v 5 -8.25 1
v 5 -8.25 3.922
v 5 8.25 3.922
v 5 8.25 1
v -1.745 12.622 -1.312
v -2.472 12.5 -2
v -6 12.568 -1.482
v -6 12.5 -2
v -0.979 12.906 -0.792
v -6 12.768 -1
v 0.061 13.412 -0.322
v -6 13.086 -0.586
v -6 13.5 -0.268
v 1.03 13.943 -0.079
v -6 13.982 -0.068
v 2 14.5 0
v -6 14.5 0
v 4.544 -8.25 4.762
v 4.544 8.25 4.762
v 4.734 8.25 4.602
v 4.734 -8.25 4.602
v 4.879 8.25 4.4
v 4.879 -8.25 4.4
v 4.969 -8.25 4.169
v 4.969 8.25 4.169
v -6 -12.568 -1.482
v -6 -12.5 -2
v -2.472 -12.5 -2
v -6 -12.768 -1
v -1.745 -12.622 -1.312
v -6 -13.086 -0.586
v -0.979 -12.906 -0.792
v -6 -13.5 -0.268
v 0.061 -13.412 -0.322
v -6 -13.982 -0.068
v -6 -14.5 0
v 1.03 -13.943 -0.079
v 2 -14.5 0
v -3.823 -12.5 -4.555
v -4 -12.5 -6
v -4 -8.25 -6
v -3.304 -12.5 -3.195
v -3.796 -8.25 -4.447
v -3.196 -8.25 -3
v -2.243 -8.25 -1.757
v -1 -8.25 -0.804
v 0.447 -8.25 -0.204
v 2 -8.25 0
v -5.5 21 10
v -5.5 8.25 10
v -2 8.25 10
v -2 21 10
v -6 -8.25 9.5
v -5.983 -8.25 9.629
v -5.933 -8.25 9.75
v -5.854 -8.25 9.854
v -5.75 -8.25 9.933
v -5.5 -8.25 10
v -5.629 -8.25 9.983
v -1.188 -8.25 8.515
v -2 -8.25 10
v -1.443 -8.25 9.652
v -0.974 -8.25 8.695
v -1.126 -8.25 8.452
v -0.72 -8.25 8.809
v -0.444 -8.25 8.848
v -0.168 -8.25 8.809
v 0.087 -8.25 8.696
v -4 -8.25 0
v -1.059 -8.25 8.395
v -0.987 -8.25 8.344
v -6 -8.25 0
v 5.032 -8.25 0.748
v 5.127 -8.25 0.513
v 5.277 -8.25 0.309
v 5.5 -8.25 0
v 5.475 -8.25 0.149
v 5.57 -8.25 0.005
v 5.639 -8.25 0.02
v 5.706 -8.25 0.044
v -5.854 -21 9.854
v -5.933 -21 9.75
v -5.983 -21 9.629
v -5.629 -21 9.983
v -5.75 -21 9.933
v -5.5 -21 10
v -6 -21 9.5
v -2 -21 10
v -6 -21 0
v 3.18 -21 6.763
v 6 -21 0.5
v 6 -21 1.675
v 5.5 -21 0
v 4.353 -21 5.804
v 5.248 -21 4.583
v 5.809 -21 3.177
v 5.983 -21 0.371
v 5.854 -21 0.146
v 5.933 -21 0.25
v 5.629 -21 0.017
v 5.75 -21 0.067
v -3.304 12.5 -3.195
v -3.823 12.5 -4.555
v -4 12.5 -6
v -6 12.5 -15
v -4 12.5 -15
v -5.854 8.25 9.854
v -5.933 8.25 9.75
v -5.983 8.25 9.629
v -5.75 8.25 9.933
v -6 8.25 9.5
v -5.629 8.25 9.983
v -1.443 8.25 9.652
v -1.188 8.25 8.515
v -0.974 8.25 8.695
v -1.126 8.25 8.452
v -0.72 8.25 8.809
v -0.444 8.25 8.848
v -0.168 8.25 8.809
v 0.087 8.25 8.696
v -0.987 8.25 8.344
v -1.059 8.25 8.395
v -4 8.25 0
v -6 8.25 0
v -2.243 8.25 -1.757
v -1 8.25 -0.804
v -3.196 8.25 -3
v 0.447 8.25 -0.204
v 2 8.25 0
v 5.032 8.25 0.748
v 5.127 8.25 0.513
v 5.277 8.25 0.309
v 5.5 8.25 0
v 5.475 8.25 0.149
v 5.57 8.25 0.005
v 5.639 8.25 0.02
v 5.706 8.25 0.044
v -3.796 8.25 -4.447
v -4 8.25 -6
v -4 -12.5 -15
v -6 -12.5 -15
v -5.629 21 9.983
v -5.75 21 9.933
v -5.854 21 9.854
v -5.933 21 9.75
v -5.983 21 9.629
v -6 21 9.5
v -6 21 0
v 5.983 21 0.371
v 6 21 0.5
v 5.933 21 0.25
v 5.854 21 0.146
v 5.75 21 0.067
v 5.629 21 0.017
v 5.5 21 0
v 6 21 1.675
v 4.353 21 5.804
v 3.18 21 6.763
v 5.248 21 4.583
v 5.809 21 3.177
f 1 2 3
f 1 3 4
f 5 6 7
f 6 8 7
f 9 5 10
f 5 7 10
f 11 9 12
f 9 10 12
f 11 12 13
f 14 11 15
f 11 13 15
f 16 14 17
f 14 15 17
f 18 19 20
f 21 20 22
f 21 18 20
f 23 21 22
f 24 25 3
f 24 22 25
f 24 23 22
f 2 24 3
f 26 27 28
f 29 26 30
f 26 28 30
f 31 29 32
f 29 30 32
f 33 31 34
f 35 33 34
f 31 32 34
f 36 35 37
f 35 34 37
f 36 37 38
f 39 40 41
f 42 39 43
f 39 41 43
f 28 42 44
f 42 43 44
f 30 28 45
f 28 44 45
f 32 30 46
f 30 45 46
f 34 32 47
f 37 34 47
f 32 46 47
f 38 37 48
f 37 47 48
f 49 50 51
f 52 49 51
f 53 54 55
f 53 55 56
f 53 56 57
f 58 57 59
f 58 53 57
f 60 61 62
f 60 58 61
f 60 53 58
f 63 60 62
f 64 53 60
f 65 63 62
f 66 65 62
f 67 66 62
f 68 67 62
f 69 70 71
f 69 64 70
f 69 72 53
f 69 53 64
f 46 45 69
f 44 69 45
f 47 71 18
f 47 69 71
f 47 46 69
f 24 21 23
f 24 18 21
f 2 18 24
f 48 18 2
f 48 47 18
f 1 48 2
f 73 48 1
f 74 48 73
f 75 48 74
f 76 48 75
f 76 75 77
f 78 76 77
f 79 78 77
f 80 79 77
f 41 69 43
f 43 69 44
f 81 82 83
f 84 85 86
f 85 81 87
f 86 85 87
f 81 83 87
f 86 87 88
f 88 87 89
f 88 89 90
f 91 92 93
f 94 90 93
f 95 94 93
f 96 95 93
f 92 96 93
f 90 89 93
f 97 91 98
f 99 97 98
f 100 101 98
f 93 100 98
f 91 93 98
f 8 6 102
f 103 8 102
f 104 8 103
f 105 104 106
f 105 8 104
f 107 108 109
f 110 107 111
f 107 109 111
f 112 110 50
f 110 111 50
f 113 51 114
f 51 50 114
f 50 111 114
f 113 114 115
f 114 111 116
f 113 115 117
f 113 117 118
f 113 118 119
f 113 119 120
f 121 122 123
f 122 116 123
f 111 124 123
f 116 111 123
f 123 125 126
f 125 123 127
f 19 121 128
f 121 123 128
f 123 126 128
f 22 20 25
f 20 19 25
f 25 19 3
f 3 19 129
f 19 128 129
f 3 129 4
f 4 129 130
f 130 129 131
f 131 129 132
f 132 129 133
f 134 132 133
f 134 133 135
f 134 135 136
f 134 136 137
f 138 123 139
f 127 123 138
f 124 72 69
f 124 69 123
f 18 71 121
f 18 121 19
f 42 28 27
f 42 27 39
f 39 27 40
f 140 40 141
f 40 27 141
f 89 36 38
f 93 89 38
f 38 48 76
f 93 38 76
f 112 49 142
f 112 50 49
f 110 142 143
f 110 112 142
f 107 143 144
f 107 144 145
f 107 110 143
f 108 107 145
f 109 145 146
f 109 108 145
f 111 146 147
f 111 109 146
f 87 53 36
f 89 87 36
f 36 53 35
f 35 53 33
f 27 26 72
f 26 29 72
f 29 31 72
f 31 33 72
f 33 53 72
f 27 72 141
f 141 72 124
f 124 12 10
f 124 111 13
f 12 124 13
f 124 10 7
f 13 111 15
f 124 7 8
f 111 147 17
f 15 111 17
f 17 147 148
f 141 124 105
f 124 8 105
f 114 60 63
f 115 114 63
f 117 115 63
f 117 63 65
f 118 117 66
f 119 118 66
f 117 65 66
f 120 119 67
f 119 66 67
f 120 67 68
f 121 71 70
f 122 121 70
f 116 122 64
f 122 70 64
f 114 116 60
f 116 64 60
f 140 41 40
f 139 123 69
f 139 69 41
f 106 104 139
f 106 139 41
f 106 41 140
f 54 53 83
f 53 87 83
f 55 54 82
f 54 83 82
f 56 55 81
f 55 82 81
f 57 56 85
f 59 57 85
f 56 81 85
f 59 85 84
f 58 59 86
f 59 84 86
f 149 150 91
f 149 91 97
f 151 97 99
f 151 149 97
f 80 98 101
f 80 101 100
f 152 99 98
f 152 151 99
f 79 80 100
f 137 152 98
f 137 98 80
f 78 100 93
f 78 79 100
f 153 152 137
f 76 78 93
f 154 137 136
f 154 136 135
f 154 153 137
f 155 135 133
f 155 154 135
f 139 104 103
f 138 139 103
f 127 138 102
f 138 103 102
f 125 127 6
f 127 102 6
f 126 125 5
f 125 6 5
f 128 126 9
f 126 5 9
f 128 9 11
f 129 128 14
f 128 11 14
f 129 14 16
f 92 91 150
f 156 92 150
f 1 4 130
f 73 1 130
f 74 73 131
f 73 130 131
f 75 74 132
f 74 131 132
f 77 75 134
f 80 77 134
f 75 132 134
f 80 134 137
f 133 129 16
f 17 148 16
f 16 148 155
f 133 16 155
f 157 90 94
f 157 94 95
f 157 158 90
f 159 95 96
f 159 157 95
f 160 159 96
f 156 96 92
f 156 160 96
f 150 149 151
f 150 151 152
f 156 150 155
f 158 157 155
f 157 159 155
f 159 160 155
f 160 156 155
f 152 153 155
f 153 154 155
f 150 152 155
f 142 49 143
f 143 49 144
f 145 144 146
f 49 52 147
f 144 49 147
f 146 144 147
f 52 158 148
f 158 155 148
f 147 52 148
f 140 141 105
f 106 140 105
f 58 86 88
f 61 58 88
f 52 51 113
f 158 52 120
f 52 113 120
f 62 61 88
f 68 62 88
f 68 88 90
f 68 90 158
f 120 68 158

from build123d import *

# Parameters (mm, degrees)
BOSS_EXTRUDE1_DEPTH     = 10
CUT_EXTRUDE1_DEPTH      = 30
CUT_EXTRUDE1_DEPTH_BACK = 30
CUT_EXTRUDE4_DEPTH      = 8.25
CUT_EXTRUDE4_DEPTH_BACK = 8.25
FILLET3_R               = 0.5
BOSS_EXTRUDE2_START     = -6
SKETCH4_W               = 15
SKETCH4_H               = 25
BOSS_EXTRUDE2_DEPTH     = 2
FILLET5_R               = 6
FILLET10_R              = 2
FILLET19_R              = 6
SKETCH9_W               = 1.113670972
SKETCH9_H               = 16.5
CUT_EXTRUDE5_DEPTH      = 10
FILLET21_R              = 1


with BuildPart() as part:
    # Sketch1 → Boss-Extrude1 (new body)
    with BuildSketch(Plane.XY):
        Polygon((-6, -21), (6, -21), (6, 21), (-6, 21), (-6, 8.25), (-2, 8.25), (-2, -8.25), (-6, -8.25), align=None)
    extrude(amount=BOSS_EXTRUDE1_DEPTH)

    # Sketch2 → Cut-Extrude1 (cut, two sides: drawn at the far end of the back side and taken through both)
    with BuildSketch(Plane(origin=(0, 0, 0), x_dir=(1, 0, 0), z_dir=(0, 1, 0)).offset(-CUT_EXTRUDE1_DEPTH_BACK)):
        Polygon((-2, -10), (6, -5), (6, -10), align=None)
    extrude(amount=CUT_EXTRUDE1_DEPTH + CUT_EXTRUDE1_DEPTH_BACK, mode=Mode.SUBTRACT)

    # Sketch8 → Cut-Extrude4 (cut, two sides: drawn at the far end of the back side and taken through both)
    with BuildSketch(Plane(origin=(0, 0, 0), x_dir=(1, 0, 0), z_dir=(0, 1, 0)).offset(-CUT_EXTRUDE4_DEPTH_BACK)):
        Polygon((-2, 0), (-2, -9), (5, -4.466137359), (5, 0), align=None)
    extrude(amount=CUT_EXTRUDE4_DEPTH + CUT_EXTRUDE4_DEPTH_BACK, mode=Mode.SUBTRACT)

    # Fillet3
    fillet3_edges = [part.edges().sort_by_distance(p)[0] for p in [
        (-6, 14.625, 10),
        (6, 0, 0),
        (-6, -14.625, 10),
    ]]
    fillet(fillet3_edges, radius=FILLET3_R)

    # Sketch4 → Boss-Extrude2 (add)
    with BuildSketch(Plane(origin=(0, 0, 0), x_dir=(0, 0, -1), z_dir=(1, 0, 0)).offset(BOSS_EXTRUDE2_START)):
        with Locations((7.5, 0)):
            Rectangle(SKETCH4_W, SKETCH4_H)
    extrude(amount=BOSS_EXTRUDE2_DEPTH)

    # Fillet5
    fillet5_edges = [part.edges().sort_by_distance(p)[0] for p in [
        (-4, -10.375, 0),
        (-4, 10.375, 0),
    ]]
    fillet(fillet5_edges, radius=FILLET5_R)

    # Fillet10
    fillet10_edges = [part.edges().sort_by_distance(p)[0] for p in [
        (-2, 12.5, 0),
        (-2, -12.5, 0),
    ]]
    fillet(fillet10_edges, radius=FILLET10_R)

    # Fillet19
    fillet19_edges = [part.edges().sort_by_distance(p)[0] for p in [
        (6, 0, 5),
    ]]
    fillet(fillet19_edges, radius=FILLET19_R)

    # Sketch9 → Cut-Extrude5 (cut)
    with BuildSketch(Plane.XY):
        with Locations((-2, 0)):
            Rectangle(SKETCH9_W, SKETCH9_H)
    extrude(amount=CUT_EXTRUDE5_DEPTH, mode=Mode.SUBTRACT)

    # Fillet21
    # the kernel refuses this fillet: 1 mm, written as the material it adds along each edge
    with BuildSketch(Plane(origin=(5, -9.609341418, 4.466137359), x_dir=(0, 0, -1), z_dir=(0, 1, 0))) as fillet21_piece_1:
        with BuildLine():
            CenterArc((FILLET21_R * 0.543736567297, FILLET21_R), FILLET21_R, 212.930914829, 57.069085171)
            Line((-FILLET21_R * 0.295590096809, FILLET21_R * 0.456372599182), (0, 0))
            Line((0, 0), (FILLET21_R * 0.543736567297, 0))
        make_face()
    extrude(amount=19.218682836)
    # the kernel refuses this fillet: 1 mm, written as the material it takes off along each edge
    with BuildSketch(Plane(origin=(5, 8.25, 0), x_dir=(1, 0, 0), z_dir=(0, -1, 0))) as fillet21_2_piece_1:
        with BuildLine():
            CenterArc((FILLET21_R, FILLET21_R), FILLET21_R, 180, 90)
            Line((0, FILLET21_R), (0, 0))
            Line((0, 0), (FILLET21_R, 0))
        make_face()
    extrude(amount=16.5, mode=Mode.SUBTRACT)
    with BuildSketch(Plane(origin=(-1.443164514, -8.25, 8.639340628), x_dir=(0, 0, 1), z_dir=(0, 1, 0))) as fillet21_2_piece_2:
        with BuildLine():
            CenterArc((FILLET21_R * 0.543736567297, FILLET21_R), FILLET21_R, 212.930914829, 57.069085171)
            Line((-FILLET21_R * 0.295590096809, FILLET21_R * 0.456372599182), (0, 0))
            Line((0, 0), (FILLET21_R * 0.543736567297, 0))
        make_face()
    extrude(amount=16.5, mode=Mode.SUBTRACT)
    with BuildSketch(Plane(origin=(-1.443164514, -8.25, 9.651977821), x_dir=(0.8479983040050877, 0, -0.5299989400031806), z_dir=(0, 1, 0))) as fillet21_2_piece_3:
        with BuildLine():
            CenterArc((FILLET21_R * 1.80424764151, FILLET21_R), FILLET21_R, 147.994616792, 122.005383208)
            Line((FILLET21_R * 0.956249337502, FILLET21_R * 1.52999894), (0, 0))
            Line((0, 0), (FILLET21_R * 1.80424764151, 0))
        make_face()
    extrude(amount=16.5, mode=Mode.SUBTRACT)


solid = part.part
